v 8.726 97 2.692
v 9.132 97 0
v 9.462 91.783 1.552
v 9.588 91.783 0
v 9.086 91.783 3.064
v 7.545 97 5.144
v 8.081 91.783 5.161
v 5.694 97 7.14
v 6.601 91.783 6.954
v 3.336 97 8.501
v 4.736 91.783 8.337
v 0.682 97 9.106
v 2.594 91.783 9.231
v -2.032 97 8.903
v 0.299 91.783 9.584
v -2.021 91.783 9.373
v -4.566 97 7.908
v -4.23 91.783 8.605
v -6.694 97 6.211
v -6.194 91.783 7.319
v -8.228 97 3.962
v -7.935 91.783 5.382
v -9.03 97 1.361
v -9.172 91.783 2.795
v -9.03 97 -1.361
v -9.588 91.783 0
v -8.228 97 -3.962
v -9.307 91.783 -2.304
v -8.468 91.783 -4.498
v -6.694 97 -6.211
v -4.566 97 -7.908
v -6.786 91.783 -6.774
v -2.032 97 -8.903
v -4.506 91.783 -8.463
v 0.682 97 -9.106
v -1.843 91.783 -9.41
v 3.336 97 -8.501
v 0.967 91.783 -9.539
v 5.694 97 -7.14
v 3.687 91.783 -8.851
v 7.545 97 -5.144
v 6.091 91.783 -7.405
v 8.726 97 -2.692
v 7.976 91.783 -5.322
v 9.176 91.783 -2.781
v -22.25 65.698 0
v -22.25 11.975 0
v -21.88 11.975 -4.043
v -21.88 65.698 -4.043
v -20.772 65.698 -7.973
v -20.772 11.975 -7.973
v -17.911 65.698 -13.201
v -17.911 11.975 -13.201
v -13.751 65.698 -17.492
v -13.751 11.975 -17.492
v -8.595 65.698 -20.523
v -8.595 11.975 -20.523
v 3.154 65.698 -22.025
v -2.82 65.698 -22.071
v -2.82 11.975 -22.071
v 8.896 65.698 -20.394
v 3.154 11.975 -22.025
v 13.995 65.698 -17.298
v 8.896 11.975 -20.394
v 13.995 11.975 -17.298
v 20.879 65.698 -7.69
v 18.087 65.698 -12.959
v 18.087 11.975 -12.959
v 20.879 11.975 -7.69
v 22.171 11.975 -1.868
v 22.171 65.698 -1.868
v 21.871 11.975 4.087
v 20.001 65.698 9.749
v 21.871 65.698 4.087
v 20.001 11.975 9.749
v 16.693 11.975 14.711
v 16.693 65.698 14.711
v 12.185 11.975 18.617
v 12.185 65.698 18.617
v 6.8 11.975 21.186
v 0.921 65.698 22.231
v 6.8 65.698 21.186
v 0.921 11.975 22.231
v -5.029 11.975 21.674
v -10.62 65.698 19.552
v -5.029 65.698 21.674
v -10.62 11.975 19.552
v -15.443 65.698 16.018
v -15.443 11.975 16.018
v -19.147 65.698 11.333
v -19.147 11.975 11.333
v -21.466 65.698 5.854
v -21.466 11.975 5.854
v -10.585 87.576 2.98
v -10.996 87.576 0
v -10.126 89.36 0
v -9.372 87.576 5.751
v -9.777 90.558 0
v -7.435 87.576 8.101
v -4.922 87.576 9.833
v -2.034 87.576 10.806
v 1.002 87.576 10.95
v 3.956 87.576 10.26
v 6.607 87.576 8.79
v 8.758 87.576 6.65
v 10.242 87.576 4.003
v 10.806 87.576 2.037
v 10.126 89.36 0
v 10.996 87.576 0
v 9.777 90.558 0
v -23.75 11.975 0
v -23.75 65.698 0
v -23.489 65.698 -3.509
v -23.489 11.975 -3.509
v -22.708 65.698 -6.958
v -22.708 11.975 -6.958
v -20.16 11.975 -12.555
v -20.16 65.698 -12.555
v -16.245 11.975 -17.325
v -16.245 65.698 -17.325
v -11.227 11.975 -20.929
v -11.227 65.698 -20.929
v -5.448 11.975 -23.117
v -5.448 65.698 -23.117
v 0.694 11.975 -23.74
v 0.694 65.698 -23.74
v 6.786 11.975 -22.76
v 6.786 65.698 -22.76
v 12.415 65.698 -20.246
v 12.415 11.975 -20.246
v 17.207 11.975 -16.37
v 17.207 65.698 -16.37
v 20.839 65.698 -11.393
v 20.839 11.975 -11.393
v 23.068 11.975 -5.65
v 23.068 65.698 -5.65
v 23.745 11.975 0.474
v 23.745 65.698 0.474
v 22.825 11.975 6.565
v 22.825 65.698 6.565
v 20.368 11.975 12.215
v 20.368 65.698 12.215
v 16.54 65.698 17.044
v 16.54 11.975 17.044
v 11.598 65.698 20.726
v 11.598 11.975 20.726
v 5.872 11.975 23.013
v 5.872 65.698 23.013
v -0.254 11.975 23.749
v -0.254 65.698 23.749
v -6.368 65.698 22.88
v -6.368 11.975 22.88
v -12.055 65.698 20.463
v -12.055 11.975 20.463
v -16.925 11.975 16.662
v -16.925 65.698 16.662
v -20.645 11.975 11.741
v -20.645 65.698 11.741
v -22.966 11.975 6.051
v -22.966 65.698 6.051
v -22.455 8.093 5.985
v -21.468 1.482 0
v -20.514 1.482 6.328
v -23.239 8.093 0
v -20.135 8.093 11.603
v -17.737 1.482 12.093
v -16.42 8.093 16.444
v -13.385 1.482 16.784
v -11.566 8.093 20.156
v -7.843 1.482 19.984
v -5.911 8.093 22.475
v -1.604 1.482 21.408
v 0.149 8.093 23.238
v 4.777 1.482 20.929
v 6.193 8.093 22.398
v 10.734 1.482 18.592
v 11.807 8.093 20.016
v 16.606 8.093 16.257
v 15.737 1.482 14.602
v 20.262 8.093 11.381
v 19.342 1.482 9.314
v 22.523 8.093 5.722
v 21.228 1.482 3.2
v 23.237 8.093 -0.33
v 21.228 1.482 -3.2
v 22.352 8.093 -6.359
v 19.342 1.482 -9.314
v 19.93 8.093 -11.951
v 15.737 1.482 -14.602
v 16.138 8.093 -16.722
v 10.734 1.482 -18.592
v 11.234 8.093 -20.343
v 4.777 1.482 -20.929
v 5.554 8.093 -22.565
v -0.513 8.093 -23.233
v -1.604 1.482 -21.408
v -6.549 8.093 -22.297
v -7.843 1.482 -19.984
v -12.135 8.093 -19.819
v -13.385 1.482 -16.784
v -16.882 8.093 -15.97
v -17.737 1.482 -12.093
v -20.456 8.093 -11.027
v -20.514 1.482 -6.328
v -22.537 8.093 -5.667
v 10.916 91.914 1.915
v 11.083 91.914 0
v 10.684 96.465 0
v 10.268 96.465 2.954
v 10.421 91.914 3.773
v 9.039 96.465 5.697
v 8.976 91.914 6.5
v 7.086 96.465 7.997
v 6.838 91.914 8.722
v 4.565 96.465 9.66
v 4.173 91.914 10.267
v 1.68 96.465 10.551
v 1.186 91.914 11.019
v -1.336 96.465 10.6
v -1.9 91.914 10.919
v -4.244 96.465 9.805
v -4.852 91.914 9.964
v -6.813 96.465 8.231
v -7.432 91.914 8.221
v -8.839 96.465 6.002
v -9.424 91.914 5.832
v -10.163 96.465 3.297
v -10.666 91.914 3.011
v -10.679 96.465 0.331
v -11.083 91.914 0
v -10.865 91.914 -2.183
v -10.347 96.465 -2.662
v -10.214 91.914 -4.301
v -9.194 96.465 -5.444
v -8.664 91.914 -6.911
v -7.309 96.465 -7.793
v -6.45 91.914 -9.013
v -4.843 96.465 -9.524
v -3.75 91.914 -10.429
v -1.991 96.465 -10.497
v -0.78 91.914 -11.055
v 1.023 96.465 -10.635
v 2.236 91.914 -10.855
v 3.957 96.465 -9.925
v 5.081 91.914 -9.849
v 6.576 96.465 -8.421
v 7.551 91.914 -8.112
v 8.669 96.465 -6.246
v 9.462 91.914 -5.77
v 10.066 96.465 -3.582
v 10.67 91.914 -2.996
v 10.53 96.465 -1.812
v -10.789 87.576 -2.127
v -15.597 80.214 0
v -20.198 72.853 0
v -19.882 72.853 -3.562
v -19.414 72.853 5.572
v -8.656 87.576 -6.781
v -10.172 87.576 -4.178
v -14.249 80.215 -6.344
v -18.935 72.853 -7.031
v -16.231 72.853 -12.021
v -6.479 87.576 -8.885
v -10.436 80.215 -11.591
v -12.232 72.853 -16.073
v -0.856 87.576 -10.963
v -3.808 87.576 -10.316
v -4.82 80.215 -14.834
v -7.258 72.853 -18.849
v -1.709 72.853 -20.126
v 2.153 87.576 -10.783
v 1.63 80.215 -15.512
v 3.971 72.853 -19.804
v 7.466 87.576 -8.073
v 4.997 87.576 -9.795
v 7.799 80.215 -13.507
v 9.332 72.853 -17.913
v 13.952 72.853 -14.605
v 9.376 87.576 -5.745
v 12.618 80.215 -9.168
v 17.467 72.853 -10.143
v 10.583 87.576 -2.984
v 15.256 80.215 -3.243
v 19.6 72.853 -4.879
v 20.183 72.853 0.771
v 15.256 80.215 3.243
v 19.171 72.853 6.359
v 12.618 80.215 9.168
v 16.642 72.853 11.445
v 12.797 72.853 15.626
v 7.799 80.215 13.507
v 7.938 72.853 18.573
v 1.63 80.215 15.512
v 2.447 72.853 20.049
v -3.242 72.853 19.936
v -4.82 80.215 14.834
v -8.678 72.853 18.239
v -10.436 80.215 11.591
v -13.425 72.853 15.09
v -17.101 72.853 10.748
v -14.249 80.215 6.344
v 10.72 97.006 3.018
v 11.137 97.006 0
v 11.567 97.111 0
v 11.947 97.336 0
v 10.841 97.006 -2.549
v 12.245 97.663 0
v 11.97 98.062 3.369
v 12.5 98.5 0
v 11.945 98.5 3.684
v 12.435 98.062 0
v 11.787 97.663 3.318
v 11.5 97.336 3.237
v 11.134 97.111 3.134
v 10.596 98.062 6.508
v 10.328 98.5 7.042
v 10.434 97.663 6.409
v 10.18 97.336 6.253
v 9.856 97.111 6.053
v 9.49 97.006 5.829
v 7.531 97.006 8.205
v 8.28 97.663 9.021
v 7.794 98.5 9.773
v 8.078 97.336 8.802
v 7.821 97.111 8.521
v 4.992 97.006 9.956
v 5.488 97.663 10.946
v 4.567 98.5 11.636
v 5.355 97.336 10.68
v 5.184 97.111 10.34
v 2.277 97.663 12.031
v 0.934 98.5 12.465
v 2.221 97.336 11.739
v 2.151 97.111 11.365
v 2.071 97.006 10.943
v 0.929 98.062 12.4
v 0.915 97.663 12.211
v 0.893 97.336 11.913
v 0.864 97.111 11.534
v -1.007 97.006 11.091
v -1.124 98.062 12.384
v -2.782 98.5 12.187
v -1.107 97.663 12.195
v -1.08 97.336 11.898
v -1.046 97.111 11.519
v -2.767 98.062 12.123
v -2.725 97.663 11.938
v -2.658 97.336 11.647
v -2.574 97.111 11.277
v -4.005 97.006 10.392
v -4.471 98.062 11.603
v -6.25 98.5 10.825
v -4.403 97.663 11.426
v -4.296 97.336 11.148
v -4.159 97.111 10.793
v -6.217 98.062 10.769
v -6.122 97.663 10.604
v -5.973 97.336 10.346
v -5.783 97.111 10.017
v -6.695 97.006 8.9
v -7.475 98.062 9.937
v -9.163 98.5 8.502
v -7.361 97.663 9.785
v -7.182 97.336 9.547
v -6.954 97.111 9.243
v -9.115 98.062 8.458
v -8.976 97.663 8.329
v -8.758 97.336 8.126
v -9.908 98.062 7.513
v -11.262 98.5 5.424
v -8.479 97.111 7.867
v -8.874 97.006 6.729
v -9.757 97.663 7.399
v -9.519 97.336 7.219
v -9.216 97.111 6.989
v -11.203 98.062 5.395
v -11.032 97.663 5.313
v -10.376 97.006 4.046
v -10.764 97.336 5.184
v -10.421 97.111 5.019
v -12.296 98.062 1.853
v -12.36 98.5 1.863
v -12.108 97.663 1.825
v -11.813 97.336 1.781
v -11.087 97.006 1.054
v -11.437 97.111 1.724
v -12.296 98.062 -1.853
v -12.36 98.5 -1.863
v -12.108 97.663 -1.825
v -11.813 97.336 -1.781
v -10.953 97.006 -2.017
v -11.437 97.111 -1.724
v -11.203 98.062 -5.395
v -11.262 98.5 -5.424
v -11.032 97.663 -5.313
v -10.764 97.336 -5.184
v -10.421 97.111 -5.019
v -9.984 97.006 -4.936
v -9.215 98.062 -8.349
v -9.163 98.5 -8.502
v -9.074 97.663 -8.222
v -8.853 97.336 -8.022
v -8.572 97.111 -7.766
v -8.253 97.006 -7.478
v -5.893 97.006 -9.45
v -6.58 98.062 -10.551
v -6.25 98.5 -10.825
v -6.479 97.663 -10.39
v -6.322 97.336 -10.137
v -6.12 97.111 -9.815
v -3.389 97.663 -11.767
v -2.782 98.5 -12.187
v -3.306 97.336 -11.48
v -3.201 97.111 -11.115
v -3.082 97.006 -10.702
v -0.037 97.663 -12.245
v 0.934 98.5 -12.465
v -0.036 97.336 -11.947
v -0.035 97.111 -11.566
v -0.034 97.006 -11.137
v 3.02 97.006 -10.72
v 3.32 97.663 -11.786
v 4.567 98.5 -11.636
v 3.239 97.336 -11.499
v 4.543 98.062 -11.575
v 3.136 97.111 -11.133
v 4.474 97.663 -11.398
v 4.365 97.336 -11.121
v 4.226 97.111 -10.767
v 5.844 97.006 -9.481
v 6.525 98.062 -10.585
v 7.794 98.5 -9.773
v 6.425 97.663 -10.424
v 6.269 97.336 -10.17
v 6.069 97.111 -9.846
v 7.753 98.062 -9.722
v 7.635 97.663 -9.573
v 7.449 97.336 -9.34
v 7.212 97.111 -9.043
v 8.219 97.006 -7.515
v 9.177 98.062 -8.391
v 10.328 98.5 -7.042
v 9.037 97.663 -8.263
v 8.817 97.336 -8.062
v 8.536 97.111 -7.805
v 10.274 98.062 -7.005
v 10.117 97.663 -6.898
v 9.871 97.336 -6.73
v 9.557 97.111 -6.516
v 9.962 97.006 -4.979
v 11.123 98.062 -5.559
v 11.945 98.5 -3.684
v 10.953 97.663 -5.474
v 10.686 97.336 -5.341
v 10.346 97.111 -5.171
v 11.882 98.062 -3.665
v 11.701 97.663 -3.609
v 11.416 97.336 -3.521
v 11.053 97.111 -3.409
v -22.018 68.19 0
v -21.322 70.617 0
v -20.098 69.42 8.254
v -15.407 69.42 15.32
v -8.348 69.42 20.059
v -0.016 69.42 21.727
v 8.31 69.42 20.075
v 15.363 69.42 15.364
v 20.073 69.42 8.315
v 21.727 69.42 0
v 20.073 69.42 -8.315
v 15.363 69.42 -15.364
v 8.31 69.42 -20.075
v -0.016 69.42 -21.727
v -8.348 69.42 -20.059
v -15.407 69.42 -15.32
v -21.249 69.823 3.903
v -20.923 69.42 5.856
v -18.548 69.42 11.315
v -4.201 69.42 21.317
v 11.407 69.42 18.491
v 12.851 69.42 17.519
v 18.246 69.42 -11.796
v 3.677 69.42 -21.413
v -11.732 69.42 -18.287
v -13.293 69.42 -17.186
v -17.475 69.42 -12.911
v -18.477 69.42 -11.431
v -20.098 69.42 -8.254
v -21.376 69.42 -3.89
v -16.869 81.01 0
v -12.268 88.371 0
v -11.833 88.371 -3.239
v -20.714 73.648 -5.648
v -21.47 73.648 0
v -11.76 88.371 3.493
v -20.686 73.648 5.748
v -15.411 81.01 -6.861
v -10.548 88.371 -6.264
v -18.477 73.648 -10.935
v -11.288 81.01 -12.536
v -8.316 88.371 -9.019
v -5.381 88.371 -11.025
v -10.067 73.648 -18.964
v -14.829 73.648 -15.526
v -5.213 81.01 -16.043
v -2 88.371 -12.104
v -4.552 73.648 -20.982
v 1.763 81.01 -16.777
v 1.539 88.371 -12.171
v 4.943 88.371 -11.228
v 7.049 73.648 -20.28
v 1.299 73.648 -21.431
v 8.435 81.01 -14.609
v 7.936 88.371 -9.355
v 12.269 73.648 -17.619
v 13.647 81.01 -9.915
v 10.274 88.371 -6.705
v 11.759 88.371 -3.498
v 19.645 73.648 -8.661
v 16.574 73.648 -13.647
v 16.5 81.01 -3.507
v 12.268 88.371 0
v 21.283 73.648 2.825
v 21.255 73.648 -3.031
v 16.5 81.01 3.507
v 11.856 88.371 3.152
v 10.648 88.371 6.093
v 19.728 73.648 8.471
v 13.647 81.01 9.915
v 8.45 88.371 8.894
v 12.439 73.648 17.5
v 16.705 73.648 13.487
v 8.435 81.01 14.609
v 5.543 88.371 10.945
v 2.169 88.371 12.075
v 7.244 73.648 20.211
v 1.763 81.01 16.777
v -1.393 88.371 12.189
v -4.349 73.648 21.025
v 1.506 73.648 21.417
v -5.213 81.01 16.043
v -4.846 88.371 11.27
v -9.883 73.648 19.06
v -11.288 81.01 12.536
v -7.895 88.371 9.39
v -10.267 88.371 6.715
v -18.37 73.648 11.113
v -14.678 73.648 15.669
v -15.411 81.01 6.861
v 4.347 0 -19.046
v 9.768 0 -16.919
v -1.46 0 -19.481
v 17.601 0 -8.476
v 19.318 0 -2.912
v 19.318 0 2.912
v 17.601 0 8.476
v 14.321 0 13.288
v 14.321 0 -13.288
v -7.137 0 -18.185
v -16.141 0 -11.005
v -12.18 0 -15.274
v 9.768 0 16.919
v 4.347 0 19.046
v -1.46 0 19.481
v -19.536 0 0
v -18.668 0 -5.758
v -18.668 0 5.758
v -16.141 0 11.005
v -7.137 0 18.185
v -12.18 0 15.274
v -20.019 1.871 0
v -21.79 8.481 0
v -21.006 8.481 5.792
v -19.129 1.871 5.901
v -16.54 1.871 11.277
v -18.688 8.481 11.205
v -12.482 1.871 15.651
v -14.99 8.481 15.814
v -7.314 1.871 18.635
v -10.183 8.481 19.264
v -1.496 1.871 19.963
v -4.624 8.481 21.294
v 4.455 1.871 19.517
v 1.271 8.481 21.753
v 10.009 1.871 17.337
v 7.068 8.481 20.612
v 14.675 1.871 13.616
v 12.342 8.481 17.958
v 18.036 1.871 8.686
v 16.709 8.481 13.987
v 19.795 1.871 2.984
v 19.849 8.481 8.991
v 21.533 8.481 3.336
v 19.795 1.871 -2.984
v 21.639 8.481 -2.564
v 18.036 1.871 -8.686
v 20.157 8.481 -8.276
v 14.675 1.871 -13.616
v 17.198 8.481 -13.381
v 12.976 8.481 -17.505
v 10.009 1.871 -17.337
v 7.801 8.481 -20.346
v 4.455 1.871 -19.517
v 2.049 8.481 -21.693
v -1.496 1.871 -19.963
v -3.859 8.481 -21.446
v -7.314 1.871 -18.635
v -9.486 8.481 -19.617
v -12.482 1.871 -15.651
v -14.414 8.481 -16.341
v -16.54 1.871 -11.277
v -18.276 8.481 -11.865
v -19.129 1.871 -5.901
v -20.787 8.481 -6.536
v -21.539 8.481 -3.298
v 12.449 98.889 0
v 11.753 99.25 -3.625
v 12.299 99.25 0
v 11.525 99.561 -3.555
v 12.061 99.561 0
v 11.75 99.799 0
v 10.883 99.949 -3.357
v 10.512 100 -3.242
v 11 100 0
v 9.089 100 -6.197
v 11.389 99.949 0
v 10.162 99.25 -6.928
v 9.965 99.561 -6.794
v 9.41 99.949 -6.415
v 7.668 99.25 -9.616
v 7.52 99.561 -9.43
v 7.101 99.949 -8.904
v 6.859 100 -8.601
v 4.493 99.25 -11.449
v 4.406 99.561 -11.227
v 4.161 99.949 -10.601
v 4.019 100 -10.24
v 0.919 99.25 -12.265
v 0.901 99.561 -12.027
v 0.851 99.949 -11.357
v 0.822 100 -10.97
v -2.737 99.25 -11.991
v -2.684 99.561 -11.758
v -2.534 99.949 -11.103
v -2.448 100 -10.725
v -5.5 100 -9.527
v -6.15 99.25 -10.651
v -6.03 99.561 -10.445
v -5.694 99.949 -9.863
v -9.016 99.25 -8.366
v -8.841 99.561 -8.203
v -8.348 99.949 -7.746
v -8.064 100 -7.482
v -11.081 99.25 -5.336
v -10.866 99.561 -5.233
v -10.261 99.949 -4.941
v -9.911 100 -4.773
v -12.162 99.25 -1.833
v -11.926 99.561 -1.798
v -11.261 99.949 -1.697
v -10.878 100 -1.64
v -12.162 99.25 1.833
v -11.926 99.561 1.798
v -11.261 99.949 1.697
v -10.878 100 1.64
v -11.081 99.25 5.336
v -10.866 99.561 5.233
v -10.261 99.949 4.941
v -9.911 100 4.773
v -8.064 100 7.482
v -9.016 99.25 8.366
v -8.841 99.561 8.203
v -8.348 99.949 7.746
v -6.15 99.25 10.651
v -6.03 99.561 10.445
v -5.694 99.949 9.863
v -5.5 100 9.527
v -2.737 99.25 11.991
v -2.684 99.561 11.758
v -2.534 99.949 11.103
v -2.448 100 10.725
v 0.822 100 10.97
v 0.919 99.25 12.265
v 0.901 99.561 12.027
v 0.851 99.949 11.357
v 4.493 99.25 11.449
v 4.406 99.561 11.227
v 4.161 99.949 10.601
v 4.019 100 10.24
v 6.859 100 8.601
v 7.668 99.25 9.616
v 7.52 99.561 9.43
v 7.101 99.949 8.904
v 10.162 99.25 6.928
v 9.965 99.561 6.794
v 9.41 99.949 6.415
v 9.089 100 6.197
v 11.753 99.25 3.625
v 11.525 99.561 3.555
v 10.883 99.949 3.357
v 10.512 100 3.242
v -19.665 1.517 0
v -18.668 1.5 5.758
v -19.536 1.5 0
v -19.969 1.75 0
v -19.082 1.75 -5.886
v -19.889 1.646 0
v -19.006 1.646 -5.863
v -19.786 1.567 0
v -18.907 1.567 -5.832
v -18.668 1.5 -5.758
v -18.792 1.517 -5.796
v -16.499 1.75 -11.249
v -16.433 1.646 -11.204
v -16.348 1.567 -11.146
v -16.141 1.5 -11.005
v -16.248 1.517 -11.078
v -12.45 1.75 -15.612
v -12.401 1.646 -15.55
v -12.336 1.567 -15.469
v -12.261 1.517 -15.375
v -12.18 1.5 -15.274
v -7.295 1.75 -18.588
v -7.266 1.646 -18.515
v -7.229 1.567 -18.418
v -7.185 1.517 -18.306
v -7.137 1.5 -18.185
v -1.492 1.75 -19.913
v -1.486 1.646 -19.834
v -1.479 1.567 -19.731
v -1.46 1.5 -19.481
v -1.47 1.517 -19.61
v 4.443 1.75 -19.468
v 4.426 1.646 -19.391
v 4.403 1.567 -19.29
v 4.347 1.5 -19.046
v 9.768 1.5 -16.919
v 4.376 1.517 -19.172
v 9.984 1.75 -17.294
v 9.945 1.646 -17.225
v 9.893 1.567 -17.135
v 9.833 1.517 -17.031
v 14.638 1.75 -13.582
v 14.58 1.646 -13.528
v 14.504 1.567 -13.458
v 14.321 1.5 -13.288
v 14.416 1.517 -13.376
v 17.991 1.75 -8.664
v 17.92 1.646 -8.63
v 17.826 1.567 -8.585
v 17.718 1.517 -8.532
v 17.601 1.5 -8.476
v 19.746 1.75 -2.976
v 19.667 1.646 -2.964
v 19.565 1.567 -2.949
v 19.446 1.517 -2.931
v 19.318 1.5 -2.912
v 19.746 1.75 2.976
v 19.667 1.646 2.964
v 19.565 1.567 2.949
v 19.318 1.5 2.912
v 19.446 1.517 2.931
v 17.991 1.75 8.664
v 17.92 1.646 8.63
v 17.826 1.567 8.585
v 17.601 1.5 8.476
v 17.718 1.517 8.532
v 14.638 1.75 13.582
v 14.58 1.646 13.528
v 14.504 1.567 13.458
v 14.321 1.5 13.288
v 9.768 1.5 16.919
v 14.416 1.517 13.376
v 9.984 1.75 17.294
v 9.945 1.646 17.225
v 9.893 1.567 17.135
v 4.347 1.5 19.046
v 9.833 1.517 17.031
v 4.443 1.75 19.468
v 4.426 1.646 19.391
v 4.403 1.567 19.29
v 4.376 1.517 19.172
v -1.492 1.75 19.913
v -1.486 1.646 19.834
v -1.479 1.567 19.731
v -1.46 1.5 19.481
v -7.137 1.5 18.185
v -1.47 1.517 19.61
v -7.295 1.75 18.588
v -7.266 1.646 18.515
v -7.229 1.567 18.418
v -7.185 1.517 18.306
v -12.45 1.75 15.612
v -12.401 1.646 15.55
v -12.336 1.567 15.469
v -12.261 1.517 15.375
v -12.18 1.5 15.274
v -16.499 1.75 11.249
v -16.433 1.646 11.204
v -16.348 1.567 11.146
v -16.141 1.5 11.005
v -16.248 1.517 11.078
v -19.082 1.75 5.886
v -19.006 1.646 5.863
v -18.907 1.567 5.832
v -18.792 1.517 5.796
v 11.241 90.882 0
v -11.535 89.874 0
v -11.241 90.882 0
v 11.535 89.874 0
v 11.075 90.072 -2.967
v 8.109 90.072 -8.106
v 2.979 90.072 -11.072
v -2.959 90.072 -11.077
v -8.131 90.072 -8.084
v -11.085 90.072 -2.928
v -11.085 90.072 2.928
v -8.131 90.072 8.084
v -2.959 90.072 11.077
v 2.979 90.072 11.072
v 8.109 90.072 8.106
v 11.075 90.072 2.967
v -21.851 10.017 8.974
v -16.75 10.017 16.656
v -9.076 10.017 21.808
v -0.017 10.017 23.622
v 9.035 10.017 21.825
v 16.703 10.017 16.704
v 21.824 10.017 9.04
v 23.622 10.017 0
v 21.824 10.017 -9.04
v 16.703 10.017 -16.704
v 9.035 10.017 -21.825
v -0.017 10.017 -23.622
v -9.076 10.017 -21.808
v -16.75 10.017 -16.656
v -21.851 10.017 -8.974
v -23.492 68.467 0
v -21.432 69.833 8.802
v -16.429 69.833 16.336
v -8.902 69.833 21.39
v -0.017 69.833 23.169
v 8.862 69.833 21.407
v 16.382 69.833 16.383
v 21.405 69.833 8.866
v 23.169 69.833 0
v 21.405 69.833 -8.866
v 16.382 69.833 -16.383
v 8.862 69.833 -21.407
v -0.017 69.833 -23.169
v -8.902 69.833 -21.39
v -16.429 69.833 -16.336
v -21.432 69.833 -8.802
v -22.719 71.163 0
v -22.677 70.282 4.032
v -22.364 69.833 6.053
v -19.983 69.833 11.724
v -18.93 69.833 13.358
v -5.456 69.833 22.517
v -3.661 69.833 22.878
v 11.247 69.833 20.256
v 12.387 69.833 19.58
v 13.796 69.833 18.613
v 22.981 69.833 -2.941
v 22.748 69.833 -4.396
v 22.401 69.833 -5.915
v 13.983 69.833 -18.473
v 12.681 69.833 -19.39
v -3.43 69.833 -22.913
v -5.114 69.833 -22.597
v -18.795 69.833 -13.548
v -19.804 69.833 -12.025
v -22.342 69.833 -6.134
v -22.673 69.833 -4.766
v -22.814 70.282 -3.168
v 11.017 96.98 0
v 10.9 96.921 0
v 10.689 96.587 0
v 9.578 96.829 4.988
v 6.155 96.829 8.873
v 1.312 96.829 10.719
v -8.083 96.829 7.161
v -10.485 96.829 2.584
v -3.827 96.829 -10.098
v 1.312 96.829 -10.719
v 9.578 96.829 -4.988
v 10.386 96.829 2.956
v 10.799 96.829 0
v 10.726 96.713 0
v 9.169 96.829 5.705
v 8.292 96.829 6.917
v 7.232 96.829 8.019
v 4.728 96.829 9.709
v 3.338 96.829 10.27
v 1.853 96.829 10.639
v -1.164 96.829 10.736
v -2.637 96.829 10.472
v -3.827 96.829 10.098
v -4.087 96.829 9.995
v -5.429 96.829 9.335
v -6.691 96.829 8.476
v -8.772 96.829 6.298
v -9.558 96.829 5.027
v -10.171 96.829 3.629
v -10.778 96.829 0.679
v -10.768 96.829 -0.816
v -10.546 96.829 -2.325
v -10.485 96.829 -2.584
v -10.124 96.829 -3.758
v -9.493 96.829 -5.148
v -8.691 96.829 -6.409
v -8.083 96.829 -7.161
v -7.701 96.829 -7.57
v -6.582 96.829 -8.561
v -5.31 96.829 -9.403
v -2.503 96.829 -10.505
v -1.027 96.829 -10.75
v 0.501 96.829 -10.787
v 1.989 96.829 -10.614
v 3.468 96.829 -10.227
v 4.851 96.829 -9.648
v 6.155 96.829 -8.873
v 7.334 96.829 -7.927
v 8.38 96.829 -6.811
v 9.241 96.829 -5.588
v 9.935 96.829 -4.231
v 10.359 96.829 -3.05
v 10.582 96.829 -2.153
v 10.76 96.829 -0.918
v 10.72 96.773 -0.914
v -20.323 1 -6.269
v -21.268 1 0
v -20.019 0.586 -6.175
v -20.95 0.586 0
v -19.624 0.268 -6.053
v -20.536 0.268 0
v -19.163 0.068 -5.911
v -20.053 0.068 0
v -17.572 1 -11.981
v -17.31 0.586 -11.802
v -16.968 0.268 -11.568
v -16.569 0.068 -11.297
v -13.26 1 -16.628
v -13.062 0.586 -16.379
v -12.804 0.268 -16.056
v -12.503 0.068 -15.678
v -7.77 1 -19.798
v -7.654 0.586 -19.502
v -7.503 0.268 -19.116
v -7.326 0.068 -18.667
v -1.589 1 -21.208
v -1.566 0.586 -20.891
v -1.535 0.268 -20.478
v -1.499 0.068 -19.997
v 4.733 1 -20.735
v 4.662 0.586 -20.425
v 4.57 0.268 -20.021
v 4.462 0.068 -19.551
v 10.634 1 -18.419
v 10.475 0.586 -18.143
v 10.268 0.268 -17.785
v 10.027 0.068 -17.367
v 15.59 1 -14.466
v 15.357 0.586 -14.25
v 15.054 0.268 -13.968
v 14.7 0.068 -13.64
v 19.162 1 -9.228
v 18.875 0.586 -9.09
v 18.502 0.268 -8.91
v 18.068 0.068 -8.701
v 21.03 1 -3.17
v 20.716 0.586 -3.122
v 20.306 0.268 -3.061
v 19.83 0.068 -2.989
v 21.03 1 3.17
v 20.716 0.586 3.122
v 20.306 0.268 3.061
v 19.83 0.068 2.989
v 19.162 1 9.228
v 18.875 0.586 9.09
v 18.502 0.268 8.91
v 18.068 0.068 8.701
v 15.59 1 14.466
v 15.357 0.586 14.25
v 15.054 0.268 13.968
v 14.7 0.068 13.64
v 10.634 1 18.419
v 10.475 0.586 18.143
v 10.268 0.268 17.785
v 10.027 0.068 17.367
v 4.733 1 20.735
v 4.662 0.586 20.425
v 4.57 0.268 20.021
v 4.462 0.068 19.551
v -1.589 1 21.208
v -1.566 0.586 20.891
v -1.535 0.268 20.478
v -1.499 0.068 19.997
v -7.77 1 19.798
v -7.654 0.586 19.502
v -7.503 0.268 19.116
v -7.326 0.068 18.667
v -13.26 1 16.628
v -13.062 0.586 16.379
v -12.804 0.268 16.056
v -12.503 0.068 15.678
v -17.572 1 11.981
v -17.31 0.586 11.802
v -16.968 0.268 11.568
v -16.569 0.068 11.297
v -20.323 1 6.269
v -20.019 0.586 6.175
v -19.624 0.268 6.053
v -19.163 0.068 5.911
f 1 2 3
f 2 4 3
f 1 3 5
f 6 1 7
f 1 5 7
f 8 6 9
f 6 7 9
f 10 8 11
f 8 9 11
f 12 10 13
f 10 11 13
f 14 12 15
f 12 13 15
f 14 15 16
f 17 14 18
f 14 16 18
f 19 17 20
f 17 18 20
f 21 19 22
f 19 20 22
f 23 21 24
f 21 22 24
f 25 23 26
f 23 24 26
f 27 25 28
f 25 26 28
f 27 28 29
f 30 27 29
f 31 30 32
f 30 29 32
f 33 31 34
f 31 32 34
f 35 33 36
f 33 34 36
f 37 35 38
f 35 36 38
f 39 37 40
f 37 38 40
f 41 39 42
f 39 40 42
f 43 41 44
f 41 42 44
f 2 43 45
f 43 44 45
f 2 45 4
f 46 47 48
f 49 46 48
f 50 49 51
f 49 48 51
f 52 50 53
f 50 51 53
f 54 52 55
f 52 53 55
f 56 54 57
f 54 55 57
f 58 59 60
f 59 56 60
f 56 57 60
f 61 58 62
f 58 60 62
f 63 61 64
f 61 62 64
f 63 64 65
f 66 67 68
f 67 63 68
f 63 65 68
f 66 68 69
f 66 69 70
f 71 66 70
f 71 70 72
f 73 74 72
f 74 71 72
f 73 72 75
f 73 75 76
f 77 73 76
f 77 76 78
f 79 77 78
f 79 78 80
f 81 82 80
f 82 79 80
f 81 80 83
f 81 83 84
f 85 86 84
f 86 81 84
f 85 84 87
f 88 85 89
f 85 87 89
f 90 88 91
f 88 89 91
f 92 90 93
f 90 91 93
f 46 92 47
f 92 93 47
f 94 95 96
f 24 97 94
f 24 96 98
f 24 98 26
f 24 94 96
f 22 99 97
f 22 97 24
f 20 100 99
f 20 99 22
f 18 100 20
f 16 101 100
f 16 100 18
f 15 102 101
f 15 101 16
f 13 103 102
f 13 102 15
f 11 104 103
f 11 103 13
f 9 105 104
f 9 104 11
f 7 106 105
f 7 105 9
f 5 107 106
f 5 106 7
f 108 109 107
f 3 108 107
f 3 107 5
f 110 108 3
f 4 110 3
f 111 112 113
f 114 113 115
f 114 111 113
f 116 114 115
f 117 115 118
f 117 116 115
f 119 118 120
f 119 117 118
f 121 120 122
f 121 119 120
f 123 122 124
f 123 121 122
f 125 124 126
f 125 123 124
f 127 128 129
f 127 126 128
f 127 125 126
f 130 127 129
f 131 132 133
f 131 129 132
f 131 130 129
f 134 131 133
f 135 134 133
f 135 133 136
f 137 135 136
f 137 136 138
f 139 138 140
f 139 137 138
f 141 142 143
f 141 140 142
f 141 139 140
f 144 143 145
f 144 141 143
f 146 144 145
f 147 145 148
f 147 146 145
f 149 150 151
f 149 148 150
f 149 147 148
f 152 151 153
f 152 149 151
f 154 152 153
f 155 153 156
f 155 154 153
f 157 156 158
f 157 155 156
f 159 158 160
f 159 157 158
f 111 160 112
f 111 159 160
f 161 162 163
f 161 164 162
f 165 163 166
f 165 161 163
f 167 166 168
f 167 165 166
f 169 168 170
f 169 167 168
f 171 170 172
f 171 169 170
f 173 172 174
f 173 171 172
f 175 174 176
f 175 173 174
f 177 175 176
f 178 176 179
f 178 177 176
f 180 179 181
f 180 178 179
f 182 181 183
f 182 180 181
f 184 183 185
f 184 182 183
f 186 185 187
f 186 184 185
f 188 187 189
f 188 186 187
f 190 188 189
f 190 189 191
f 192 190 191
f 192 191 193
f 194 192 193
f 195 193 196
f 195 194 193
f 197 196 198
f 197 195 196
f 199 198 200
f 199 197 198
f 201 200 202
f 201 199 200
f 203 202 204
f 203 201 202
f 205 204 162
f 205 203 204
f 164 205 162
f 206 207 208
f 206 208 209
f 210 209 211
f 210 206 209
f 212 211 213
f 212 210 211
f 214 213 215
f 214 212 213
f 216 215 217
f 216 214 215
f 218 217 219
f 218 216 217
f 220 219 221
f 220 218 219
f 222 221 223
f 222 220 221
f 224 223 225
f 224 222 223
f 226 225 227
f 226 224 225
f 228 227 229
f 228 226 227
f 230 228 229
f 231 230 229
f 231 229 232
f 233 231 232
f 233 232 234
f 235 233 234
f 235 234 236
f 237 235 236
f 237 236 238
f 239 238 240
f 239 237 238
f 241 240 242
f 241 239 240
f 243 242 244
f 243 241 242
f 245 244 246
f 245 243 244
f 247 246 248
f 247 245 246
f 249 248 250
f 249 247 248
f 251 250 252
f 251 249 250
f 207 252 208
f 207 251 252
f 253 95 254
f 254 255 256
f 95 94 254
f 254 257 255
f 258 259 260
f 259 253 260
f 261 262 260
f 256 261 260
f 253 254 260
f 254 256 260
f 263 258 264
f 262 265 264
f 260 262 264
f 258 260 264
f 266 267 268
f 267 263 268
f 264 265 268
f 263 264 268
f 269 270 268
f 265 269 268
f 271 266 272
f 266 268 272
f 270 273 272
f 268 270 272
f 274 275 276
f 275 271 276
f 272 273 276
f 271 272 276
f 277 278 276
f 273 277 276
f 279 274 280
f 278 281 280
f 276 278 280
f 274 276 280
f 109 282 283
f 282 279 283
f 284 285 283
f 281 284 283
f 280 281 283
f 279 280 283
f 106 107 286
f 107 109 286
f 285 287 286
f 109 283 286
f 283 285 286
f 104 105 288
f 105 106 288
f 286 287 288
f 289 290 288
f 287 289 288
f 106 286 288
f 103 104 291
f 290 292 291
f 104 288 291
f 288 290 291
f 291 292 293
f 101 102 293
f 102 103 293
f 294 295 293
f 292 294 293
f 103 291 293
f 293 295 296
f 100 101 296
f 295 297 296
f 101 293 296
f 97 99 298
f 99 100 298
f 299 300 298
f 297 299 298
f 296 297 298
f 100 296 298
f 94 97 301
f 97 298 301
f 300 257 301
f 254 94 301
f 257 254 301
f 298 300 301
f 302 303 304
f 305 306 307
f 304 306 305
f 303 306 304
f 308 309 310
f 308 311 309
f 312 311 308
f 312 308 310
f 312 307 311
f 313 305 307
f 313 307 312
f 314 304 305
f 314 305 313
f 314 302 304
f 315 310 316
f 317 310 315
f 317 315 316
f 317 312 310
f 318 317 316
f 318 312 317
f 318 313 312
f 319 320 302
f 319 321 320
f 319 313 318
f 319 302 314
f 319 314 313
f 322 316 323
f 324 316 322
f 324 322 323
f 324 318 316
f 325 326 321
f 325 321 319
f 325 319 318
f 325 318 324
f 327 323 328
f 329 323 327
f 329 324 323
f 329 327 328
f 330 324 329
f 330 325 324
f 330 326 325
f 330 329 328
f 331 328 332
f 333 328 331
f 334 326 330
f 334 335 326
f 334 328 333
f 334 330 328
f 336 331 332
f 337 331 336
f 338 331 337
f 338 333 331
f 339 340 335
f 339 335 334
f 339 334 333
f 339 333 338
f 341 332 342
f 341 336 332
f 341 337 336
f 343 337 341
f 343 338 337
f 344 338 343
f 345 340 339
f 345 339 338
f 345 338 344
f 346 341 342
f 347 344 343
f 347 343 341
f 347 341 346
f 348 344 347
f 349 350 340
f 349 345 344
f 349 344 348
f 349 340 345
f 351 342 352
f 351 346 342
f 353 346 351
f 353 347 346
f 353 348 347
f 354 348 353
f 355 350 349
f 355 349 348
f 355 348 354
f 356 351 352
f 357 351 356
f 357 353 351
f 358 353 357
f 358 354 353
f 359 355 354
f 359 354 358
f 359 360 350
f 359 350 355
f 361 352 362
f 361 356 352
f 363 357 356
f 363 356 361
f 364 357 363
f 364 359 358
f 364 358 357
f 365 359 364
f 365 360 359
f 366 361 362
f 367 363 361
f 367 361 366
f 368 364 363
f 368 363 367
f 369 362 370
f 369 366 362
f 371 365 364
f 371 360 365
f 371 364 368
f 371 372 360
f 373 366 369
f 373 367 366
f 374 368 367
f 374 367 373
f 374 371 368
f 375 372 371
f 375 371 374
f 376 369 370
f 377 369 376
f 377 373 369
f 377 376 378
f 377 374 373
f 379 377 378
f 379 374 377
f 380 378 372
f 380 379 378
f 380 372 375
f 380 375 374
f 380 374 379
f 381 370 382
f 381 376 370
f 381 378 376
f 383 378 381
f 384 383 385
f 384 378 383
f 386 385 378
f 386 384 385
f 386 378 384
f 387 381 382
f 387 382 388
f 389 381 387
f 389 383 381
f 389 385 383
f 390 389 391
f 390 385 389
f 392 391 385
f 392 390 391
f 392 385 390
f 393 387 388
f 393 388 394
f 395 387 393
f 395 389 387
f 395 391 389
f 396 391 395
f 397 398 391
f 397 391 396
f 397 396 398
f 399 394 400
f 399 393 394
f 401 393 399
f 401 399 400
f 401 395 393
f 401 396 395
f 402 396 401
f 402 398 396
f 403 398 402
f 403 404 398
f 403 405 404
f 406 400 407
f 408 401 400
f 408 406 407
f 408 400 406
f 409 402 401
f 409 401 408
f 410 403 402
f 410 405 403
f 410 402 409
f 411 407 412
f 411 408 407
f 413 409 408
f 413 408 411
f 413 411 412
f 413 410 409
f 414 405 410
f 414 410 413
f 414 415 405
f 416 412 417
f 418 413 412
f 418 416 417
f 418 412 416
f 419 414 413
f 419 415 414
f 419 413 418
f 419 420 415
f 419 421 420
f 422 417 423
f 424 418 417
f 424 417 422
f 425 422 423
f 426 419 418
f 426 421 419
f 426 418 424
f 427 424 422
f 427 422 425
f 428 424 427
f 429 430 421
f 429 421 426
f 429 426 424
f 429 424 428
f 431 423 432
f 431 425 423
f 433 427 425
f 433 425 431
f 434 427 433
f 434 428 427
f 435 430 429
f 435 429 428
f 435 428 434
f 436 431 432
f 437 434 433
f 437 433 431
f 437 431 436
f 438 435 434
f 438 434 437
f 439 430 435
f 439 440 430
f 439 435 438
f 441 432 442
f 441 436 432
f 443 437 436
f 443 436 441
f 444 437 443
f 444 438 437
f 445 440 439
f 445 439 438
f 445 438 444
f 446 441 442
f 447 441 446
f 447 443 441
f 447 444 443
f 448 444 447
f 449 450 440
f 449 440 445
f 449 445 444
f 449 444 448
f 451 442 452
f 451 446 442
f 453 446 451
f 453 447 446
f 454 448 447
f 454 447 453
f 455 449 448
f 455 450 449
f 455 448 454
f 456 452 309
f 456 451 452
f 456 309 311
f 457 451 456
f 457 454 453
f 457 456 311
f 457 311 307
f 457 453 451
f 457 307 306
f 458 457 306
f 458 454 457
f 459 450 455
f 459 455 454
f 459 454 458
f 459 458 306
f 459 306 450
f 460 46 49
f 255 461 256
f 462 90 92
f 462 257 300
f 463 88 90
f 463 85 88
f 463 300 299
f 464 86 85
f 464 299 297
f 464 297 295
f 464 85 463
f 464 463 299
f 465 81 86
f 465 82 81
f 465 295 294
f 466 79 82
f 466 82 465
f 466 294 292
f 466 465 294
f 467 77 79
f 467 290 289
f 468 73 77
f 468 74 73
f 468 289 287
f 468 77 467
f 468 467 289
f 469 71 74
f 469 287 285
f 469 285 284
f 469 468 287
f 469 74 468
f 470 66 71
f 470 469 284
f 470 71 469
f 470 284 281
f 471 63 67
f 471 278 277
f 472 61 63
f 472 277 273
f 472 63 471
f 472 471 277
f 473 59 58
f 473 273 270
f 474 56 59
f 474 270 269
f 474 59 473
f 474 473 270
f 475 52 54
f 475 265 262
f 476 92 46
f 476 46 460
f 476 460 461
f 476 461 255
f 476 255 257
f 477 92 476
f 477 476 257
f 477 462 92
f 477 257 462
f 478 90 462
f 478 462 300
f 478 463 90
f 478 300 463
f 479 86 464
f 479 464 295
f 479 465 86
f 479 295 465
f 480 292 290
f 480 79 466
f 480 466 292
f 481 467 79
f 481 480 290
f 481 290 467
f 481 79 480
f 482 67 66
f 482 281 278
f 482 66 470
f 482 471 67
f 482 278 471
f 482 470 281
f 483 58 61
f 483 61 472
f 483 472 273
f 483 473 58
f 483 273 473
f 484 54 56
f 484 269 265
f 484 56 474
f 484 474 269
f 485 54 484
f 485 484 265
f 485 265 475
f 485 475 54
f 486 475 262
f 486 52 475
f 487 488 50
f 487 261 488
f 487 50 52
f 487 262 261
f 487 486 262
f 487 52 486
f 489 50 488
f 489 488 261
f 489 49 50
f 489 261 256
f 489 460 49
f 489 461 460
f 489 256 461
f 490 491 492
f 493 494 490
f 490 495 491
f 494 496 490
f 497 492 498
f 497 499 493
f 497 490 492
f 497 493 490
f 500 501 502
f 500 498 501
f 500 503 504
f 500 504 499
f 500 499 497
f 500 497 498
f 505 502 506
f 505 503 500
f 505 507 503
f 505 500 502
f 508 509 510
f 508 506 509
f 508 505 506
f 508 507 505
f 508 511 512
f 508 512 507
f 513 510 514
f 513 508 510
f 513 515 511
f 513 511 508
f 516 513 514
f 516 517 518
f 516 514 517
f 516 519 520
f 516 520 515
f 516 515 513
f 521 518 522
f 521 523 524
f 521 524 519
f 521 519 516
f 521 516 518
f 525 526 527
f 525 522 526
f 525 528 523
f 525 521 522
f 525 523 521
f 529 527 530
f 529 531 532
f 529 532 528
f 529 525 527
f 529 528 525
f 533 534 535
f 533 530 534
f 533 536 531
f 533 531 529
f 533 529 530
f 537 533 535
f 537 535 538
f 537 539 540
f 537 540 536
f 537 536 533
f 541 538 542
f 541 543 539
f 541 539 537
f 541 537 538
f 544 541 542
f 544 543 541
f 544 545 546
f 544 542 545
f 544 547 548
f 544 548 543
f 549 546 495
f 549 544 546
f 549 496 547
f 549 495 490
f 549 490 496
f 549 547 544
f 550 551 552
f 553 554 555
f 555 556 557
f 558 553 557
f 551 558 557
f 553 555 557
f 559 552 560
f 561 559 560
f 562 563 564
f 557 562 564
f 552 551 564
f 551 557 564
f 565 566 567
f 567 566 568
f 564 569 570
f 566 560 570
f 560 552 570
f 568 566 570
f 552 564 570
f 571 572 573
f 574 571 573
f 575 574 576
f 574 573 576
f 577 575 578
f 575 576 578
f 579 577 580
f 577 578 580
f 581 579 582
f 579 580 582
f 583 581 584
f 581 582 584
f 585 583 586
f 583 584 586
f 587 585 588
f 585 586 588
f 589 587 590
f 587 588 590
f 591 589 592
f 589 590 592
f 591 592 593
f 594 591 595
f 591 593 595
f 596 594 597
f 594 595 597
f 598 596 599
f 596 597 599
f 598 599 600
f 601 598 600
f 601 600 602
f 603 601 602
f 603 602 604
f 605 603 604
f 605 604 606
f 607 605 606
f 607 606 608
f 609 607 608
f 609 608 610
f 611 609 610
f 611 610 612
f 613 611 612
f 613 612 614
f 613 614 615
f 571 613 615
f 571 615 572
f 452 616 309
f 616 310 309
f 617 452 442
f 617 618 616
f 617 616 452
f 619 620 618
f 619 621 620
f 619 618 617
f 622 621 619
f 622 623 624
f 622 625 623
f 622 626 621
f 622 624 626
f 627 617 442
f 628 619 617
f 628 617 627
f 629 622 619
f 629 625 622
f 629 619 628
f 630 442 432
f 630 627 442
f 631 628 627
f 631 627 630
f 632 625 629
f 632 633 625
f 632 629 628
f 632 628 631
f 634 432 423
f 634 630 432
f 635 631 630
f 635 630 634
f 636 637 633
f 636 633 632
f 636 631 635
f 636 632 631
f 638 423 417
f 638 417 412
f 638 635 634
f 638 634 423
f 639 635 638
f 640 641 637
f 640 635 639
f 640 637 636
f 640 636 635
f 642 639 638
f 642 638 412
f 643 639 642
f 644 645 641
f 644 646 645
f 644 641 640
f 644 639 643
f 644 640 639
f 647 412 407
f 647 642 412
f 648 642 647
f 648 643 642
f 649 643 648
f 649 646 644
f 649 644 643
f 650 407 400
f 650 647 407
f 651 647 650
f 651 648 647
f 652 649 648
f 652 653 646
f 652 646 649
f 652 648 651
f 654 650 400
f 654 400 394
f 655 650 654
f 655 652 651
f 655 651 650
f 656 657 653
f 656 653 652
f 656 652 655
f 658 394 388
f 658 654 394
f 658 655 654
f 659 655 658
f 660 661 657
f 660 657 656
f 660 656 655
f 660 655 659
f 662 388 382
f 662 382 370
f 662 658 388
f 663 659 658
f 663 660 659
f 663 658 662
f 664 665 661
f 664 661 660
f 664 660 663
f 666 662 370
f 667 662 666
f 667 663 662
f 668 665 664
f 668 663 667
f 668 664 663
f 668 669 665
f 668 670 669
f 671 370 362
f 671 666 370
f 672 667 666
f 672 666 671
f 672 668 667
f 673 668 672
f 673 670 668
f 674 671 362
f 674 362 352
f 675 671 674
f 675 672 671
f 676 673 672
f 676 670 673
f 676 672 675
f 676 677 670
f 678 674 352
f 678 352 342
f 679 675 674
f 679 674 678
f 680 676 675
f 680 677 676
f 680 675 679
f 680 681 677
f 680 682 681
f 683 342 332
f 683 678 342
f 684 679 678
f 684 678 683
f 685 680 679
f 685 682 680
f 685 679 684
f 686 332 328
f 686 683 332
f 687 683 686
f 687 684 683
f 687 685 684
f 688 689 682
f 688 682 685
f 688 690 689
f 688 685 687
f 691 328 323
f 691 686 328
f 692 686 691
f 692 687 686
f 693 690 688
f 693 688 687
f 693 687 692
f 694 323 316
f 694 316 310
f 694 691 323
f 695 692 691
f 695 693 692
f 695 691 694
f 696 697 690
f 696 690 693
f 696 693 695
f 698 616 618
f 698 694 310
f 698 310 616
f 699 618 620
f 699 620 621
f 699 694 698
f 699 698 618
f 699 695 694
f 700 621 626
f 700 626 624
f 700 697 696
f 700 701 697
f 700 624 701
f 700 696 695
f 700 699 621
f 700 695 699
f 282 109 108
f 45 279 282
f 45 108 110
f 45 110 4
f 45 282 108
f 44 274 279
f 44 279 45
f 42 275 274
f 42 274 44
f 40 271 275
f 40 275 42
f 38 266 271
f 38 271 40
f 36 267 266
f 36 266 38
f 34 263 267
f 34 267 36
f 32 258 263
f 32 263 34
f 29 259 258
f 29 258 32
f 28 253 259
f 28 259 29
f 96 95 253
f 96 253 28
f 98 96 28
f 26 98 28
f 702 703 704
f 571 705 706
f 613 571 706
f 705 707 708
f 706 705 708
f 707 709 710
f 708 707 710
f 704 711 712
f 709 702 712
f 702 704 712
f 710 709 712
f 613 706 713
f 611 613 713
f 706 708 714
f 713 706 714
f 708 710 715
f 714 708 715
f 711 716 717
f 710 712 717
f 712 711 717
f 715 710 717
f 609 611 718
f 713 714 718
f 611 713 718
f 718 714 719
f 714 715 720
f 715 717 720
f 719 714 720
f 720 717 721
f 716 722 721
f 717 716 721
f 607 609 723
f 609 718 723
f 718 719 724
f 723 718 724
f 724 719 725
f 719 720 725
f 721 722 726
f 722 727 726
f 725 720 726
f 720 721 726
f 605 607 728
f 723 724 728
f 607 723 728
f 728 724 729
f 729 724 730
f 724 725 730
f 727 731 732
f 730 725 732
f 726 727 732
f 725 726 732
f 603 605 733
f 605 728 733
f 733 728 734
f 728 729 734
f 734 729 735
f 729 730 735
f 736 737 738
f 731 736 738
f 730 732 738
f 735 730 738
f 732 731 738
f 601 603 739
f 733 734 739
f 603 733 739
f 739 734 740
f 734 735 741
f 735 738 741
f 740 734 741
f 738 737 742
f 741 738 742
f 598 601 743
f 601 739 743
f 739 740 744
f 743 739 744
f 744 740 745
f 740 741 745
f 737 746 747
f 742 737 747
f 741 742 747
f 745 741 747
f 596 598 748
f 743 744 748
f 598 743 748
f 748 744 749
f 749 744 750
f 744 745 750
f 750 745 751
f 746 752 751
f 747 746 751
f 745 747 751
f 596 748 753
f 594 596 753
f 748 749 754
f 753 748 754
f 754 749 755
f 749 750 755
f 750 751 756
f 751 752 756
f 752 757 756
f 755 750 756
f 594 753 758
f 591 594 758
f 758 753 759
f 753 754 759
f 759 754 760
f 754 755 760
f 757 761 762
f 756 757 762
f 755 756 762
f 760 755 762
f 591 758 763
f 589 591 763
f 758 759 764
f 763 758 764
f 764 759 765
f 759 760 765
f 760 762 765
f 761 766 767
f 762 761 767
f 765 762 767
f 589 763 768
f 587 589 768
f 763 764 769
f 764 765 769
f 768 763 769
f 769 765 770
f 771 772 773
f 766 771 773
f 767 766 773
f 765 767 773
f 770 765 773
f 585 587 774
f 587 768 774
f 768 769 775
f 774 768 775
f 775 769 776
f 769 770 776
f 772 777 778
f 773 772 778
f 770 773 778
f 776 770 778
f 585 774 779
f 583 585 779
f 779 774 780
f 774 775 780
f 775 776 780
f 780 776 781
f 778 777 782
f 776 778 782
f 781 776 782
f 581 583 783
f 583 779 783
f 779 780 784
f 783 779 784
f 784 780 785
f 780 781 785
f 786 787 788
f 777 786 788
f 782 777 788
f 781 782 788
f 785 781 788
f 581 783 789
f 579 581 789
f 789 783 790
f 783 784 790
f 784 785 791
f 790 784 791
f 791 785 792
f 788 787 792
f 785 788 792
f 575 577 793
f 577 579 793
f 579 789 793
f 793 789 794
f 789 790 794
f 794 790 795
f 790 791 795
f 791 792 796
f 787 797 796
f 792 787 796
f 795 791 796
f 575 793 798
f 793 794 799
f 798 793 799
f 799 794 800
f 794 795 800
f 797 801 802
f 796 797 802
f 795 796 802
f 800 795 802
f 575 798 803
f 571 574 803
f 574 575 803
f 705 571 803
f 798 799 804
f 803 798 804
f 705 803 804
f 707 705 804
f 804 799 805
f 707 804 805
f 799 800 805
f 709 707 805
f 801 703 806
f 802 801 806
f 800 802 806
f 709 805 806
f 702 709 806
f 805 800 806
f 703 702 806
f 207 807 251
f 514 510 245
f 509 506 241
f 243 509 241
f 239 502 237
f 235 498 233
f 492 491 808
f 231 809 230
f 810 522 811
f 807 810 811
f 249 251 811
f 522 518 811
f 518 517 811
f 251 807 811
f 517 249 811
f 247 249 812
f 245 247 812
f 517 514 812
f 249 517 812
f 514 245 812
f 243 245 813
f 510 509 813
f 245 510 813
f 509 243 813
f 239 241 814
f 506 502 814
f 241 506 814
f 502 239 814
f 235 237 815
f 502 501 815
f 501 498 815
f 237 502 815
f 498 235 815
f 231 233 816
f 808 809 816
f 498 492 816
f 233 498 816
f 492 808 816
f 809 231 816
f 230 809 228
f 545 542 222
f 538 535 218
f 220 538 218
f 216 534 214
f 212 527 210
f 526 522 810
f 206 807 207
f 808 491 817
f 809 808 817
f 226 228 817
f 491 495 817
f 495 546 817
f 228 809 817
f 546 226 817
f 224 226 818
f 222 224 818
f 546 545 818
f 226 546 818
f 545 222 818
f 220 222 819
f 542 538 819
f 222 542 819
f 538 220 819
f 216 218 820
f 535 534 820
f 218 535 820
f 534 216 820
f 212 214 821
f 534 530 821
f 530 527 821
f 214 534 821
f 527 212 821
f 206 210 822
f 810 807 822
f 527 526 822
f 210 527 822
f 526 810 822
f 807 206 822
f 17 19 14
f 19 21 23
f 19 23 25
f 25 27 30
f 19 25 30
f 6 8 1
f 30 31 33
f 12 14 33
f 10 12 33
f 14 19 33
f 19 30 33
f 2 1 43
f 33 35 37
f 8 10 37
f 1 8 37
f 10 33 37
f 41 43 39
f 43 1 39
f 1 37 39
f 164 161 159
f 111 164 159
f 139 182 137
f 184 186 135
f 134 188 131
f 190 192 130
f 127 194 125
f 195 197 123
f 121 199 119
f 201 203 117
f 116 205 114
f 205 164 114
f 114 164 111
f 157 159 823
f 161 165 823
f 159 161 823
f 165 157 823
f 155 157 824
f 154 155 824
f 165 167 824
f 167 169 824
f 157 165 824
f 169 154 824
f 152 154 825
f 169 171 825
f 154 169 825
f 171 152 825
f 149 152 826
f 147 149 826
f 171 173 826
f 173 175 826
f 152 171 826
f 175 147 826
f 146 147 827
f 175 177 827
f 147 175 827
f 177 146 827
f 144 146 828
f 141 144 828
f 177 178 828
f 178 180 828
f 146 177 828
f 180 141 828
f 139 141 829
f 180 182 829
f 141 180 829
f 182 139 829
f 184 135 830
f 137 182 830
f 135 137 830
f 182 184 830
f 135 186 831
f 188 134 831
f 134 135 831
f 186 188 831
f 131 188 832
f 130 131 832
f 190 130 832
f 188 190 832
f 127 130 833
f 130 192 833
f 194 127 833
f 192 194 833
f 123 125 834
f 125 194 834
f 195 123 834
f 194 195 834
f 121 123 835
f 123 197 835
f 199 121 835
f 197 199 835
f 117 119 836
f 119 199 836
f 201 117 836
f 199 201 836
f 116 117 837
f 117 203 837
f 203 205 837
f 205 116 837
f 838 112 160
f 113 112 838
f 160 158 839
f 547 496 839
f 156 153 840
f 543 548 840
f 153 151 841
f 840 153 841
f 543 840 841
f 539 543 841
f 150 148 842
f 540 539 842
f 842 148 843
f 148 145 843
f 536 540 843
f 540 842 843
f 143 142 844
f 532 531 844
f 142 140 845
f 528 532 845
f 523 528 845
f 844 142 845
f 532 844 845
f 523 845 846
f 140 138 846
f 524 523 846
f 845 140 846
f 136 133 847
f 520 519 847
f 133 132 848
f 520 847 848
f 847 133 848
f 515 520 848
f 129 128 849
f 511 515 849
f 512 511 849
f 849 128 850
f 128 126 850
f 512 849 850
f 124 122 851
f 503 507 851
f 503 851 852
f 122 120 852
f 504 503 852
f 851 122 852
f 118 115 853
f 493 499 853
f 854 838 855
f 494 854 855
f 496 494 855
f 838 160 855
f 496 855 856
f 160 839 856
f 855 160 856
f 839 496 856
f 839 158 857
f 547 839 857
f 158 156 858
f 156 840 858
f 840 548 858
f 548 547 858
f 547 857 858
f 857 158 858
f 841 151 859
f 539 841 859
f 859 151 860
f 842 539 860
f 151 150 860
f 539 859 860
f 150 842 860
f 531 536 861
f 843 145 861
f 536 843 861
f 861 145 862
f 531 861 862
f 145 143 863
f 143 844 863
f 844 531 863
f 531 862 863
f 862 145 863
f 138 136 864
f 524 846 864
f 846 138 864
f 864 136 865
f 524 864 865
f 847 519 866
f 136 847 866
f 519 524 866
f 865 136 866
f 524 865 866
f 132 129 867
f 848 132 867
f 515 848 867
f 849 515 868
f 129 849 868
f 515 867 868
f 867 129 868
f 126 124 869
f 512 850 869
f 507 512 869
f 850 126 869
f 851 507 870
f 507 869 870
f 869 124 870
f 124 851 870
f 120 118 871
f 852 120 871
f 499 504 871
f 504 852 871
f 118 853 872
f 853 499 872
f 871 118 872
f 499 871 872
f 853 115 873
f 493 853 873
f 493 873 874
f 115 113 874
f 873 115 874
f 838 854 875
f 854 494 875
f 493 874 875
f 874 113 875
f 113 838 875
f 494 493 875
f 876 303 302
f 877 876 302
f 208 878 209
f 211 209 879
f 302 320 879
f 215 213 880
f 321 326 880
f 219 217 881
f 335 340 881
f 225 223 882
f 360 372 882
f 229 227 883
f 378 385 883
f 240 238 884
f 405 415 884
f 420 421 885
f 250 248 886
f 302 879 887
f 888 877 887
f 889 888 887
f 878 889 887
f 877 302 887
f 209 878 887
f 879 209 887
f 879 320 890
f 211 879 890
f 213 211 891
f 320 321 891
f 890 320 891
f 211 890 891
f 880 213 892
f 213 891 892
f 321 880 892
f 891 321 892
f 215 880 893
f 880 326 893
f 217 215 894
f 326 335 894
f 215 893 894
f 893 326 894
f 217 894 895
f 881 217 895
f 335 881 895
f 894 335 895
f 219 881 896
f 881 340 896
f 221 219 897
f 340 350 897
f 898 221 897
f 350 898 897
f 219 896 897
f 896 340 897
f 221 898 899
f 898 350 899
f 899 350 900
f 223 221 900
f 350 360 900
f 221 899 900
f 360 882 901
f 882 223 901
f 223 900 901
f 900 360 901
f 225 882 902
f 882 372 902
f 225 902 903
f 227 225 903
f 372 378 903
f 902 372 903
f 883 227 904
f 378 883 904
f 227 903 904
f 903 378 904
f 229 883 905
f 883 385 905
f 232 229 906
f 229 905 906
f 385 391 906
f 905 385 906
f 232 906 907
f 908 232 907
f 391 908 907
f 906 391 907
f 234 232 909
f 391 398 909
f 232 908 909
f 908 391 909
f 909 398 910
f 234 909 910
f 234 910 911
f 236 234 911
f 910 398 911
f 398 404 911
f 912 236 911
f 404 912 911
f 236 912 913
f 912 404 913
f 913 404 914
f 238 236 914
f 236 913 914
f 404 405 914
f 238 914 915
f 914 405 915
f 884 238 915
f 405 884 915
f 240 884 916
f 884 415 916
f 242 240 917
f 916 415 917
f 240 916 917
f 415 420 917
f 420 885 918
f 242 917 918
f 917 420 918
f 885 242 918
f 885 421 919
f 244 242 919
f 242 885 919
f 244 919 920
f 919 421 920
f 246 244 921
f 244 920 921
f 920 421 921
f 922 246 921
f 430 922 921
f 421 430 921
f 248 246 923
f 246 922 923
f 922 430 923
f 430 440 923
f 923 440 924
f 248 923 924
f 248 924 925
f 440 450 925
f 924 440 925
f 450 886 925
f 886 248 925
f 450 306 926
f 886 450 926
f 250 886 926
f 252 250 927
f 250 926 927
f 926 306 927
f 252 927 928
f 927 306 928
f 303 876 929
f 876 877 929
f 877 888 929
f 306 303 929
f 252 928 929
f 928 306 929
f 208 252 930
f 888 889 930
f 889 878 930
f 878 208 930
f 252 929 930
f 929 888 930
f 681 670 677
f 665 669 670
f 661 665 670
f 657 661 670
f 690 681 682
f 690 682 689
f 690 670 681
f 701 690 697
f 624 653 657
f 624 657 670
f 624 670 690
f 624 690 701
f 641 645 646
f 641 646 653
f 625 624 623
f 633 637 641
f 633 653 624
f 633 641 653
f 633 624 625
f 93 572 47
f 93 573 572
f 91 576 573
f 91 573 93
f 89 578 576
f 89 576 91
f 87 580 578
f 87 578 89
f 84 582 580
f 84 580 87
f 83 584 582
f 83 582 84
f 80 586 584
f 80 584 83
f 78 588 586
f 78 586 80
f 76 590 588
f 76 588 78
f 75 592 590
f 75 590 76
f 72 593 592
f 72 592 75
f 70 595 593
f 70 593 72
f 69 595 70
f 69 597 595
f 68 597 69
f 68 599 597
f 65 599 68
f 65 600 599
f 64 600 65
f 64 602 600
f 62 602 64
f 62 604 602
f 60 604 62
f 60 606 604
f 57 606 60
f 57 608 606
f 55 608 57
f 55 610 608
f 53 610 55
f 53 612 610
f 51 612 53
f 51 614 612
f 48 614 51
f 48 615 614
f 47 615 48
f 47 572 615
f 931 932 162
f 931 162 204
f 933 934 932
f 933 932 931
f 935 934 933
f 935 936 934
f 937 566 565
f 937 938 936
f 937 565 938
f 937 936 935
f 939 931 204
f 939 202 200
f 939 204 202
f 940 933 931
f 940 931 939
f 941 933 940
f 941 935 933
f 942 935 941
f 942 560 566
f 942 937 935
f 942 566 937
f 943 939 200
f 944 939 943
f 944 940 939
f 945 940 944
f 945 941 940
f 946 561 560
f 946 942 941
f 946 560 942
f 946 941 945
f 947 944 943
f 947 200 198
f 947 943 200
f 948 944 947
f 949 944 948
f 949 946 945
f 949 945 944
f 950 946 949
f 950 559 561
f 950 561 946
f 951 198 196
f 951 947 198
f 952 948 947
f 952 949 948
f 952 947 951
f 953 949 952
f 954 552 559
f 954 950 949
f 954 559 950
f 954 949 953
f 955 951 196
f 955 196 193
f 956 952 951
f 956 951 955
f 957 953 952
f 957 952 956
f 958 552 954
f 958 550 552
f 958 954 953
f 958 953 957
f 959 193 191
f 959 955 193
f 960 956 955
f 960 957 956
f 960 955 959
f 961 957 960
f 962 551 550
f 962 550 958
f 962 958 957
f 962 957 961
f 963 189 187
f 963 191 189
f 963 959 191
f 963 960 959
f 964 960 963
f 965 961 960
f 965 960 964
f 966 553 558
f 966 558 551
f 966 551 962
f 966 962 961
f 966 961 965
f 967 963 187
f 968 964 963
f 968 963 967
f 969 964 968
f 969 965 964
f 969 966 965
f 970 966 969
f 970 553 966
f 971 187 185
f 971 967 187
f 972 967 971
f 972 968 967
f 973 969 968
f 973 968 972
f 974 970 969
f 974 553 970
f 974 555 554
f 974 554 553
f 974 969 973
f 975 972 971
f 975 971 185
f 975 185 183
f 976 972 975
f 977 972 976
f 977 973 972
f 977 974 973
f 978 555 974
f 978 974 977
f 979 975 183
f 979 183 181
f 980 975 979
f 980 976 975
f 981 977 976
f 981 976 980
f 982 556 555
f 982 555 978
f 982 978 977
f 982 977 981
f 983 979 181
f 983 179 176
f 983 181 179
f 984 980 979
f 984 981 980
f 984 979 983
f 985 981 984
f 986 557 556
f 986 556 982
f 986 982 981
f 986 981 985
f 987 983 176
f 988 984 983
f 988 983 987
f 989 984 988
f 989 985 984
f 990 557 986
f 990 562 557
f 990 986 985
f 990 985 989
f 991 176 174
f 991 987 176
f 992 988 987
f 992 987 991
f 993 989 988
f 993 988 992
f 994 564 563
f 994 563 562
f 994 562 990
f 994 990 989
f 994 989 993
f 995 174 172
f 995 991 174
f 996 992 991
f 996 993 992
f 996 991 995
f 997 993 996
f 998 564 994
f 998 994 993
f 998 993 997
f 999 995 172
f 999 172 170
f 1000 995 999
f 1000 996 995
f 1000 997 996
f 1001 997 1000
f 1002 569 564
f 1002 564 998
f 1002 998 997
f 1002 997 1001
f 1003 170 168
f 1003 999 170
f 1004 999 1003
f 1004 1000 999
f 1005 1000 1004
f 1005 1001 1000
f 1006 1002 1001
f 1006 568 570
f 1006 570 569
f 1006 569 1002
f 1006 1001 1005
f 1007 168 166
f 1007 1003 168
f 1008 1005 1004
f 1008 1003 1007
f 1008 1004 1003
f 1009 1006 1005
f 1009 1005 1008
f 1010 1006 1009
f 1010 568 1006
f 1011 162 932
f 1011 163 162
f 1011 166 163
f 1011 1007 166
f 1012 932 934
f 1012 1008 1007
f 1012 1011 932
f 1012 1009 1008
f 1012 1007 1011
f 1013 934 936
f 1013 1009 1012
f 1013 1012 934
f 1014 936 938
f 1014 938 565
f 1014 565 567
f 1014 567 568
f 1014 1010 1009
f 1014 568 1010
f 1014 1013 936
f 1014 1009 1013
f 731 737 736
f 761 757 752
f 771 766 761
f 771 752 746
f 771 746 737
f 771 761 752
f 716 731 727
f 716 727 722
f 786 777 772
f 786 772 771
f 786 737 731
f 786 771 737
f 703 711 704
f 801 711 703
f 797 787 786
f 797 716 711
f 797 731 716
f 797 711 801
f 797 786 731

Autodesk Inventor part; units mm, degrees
ref_plane "YZ Plane" through (0, 0, 0) normal (1, 0, 0) x (0, 1, 0)
ref_plane "XZ Plane" through (0, 0, 0) normal (0, 1, 0) x (-1, 0, 0)
ref_plane "XY Plane" through (0, 0, 0) normal (0, 0, 1) x (1, 0, 0)
sketch "Sketch1" plane through (0, 0, 0) normal (0, 1, 0) x (-1, 0, 0)
  circle A0 centre (0, 0) radius 23.75
  dimension "d0" = 47.5
extrude "Extrusion1" add sketch "Sketch1" along normal blind 90
chamfer "Chamfer1" distance 10 angle 15 1 edges at (23.75, 0, 0) measured on face at (-23.673, 60, -1.9111)
chamfer "Chamfer2" distance 12.5 distance2 20 1 edges at (23.75, 90, 0) measured on face at (-5.9257, 90, 5.2497)
sketch "Sketch2" plane through (0, 90, 0) normal (0, 1, 0) x (1, 0, 0)
  circle A0 centre (0, 0) radius 11.25 projected
  circle A1 centre (0, 0) radius 11.25
extrude "Extrusion2" add sketch "Sketch2" along normal blind 7 draft -5
fillet "Fillet6" radius 2 1 edges at (21.0705, 0, 0)
fillet "Fillet5" radius 15 1 edges at (23.75, 10, 0)
fillet "Fillet4" radius 15 1 edges at (23.75, 70, 0)
fillet "Fillet3" radius 8 2 edges at (0, 90, -11.25) (0, 90, 11.25)
shell "Shell1" thickness 1.5 removed faces 1 at (1.8241, 97, -2.1468)
sketch "Sketch3" plane through (0, 97, 0) normal (0, 1, 0) x (1, 0, 0)
  circle A0 centre (0, 0) radius 12.5
  dimension "d11" = 25
extrude "Extrusion3" add sketch "Sketch3" along normal blind 3
fillet "Fillet1" radius 1.5 2 edges at (-12.5, 100, 0) (-12.5, 97, 0)
fillet "Fillet2" radius 0.5 1 edges at (-10.6376, 97, 0)
properties part number "100ml Bottle 2" material "Glass"
